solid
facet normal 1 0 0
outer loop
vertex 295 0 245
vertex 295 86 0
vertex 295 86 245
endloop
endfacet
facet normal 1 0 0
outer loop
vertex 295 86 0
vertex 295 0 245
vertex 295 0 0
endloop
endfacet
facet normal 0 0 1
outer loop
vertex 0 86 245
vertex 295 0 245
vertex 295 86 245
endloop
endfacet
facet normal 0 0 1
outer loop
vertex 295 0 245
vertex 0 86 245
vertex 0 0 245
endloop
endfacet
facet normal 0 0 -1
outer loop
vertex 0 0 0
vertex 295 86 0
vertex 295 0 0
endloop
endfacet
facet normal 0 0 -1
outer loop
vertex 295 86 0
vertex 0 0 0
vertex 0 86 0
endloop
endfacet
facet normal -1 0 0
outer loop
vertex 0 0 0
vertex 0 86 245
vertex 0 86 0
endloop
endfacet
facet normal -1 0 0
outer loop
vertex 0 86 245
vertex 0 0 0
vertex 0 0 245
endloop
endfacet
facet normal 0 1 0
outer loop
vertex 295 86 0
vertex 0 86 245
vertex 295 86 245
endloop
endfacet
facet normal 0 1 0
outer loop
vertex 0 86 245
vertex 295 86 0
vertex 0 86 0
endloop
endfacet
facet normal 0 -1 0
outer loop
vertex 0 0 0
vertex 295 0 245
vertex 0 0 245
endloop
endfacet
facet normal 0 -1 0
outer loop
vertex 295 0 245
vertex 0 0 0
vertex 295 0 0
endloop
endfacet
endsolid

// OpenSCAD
////////////////////////////////////////////////
/////////////Open SCAD ////////////////////////
/*//////////////////////////////////////////////

date started  ///1.6.2020
date finished
modler Colin 
/*


cylinder ([]) ;   sphere();  cube([]);
square ([]);  circle();
*/


///////////////////////////////////////////////
////////////////////////////////////////////////
////////////////////parameters//////////////////
////////////////////////////////////////////////
//globals
Enclosure_width=300;
Enclosure_height=250;
Enclosure_depth=90;


////////////////////////////////////////////////
/////////////////////renders////////////////////
///////////////////////////////////////////////

ComplexObject();

////////////////////////////////////////////////
////////////////////modules////////////////////
///////////////////////////////////////////////
//cylinder () ;   sphere();  cube([]);
//square ([]);  circle();


$fn = 100;
//import();

module ComplexObject()
{
difference()
    {

        
        
        union()//Add things to object

       {
           
cube([Enclosure_width-5,Enclosure_depth-4,Enclosure_height-5]);

           
           }
           
           
    
            union()//Subtract things from object
    {
       translate([-10,-5,-10]){
           rotate([0,95,0]){
           
       #cube([Enclosure_width+90,Enclosure_depth+10,Enclosure_height]);
       
                   }
               }
      
}
 

  }


    

}
